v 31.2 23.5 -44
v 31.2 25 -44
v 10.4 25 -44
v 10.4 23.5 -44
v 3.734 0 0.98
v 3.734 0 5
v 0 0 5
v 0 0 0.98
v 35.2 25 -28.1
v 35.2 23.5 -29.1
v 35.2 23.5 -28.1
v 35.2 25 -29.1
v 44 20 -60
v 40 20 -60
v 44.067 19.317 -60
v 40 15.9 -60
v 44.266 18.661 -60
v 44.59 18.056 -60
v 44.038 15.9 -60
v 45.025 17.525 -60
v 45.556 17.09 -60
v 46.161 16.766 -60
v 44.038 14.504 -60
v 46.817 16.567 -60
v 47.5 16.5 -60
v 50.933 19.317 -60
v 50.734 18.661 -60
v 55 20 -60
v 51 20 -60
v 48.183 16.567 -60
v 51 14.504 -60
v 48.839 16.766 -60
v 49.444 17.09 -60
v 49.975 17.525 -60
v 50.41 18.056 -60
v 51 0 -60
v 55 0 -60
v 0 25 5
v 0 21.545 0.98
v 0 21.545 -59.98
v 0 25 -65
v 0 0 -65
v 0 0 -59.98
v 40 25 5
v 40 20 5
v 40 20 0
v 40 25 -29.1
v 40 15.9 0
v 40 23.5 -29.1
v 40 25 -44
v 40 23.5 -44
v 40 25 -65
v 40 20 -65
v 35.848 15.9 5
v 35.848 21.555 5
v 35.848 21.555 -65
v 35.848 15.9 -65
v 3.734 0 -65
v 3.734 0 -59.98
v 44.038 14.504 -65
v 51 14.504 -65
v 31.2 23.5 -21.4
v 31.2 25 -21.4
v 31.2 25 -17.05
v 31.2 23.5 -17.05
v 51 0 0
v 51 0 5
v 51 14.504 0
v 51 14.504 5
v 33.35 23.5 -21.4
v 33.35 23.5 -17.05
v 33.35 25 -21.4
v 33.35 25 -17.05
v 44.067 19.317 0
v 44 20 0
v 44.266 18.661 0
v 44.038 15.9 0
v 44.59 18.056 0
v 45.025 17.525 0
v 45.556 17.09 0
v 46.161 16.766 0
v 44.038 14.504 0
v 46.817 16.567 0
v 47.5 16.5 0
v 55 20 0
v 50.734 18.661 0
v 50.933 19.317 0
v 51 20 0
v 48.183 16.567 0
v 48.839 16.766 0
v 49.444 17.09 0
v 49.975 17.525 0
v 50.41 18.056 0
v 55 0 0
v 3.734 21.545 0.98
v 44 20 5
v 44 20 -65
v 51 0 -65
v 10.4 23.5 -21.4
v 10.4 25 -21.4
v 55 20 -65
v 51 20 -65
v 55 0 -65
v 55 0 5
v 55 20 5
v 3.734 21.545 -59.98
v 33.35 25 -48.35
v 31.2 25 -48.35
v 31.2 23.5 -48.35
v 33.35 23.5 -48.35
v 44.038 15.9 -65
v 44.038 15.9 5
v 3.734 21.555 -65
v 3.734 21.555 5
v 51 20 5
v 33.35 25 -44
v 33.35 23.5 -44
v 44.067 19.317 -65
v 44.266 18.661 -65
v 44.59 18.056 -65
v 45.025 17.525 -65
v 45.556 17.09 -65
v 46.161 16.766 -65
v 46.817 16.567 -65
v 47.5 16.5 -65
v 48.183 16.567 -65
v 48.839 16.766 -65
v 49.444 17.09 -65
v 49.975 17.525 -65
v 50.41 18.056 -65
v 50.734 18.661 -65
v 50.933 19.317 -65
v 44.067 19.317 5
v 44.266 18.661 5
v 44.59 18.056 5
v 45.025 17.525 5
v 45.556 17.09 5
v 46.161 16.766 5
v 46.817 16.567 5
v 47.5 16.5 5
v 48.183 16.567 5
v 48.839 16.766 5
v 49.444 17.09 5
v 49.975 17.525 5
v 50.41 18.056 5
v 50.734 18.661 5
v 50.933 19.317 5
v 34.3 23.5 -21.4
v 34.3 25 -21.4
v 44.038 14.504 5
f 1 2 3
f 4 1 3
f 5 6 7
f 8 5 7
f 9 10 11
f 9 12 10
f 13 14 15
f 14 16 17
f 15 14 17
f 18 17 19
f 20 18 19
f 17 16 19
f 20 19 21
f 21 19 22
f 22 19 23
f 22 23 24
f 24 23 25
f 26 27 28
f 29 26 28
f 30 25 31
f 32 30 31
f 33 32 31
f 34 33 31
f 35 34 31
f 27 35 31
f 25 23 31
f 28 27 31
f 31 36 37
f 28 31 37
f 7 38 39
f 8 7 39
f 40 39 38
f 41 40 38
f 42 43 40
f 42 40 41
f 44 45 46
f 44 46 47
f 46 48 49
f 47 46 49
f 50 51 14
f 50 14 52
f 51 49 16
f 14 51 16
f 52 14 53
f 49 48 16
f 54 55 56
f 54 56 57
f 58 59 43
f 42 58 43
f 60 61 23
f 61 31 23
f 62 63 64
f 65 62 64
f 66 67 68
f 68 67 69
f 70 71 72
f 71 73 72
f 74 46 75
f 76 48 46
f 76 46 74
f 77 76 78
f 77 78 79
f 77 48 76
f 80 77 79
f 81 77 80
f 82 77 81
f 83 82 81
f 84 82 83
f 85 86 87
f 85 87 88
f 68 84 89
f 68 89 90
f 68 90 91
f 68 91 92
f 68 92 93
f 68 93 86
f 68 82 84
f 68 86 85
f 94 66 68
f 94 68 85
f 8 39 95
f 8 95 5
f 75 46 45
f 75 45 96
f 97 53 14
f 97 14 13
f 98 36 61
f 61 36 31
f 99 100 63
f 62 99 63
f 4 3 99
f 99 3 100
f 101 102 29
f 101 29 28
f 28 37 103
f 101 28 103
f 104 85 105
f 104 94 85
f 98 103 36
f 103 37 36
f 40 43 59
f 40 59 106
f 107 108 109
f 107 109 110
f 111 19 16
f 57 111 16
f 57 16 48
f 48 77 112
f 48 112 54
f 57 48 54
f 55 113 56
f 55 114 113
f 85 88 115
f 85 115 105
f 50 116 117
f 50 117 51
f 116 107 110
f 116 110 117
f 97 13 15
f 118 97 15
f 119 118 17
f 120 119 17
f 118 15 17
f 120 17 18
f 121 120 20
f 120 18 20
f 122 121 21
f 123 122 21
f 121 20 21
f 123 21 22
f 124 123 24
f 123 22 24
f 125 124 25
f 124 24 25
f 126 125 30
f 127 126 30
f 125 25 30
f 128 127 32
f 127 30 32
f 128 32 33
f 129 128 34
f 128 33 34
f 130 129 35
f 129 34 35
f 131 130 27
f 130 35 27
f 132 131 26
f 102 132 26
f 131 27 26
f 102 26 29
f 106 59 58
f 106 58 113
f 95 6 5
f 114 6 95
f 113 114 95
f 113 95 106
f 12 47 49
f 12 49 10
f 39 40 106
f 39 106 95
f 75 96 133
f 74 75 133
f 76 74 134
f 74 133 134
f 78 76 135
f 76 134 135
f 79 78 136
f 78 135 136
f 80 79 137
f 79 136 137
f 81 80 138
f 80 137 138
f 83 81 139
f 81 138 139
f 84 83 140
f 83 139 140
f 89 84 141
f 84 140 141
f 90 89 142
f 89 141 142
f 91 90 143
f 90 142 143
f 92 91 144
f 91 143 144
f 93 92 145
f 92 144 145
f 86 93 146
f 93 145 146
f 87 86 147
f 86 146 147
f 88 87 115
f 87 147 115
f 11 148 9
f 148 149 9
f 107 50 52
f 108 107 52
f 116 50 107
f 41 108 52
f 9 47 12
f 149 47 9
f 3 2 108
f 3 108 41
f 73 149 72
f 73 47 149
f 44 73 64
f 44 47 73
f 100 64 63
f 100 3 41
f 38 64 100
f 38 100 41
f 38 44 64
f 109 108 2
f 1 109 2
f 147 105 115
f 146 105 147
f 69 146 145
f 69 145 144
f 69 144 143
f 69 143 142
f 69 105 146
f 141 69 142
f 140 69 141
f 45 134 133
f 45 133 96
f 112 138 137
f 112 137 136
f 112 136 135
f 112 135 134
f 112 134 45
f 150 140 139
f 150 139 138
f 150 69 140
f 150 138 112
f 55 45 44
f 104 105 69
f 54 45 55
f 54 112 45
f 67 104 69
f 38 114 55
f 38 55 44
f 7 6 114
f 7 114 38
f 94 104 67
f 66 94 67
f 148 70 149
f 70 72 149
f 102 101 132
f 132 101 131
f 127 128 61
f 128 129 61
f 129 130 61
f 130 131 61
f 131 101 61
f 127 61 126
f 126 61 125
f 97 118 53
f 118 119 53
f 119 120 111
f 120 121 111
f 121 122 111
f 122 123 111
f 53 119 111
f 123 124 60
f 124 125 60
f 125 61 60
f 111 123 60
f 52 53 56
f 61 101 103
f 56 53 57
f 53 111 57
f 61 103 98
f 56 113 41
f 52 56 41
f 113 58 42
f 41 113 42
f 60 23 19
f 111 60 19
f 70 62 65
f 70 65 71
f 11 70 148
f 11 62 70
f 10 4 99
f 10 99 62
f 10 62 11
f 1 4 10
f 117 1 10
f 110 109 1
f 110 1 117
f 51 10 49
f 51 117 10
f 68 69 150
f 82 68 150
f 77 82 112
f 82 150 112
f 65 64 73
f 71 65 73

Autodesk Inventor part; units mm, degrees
ref_plane "YZ Plane" through (0, 0, 0) normal (1, 0, 0) x (0, 1, 0)
ref_plane "XZ Plane" through (0, 0, 0) normal (0, 1, 0) x (-1, 0, 0)
ref_plane "XY Plane" through (0, 0, 0) normal (0, 0, 1) x (1, 0, 0)
sketch "Sketch1" plane through (0, 0, 0) normal (0, 1, 0) x (-1, 0, 0)
  line L0 (-40, 0) -> (-40, -60)
  line L1 (0, -60) -> (0, 0)
  line L2 (-40, -60) -> (-55, -60)
  line L3 (-55, -60) -> (-55, -65)
  line L4 (-55, -65) -> (0, -65)
  line L5 (0, -65) -> (0, -60)
  line L6 (-40, 0) -> (-55, 0)
  line L7 (-55, 0) -> (-55, 5)
  line L8 (-55, 5) -> (0, 5)
  line L9 (0, 5) -> (0, 0)
extrude "Extrusion1" add sketch "Sketch1" along normal blind 25
sketch "Sketch2" plane through (0, 25, 0) normal (0, 1, 0) x (1, 0, 0)
  line L0 (55, 0) -> (40, 0) projected
  line L1 (40, 0) -> (55, 0)
  line L2 (55, 0) -> (55, -5)
  line L3 (55, -5) -> (40, -5)
  line L4 (40, -5) -> (40, 0)
  line L5 (40, 0) -> (40, 60) projected
  line L6 (55, 60) -> (55, 65) projected
  line L7 (40, 60) -> (55, 60)
  line L8 (55, 60) -> (55, 65)
  line L9 (55, 65) -> (40, 65)
  line L10 (40, 65) -> (40, 60)
  point P0 (0, 0)
extrude "Extrusion2" cut sketch "Sketch2" against normal blind 5
sketch "Sketch3" plane through (0, 0, 5) normal (0, 0, 1) x (1, 0, 0)
  line L0 (55, 20) -> (40, 20) projected
  circle A0 centre (47.5, 20) radius 3.5
  point P0 (0, 0)
  dimension "d10" = 7
extrude "Extrusion3" cut sketch "Sketch3" against normal through all
sketch "Sketch4" plane through (0, 25, 0) normal (0, 1, 0) x (1, 0, 0)
  line L0 (40, 0) -> (40, 60) projected
  line L1 (40, 44.0004) -> (40, 29.1004)
  line L2 (31.2, 48.3504) -> (31.2, 44.0004)
  line L3 (31.2, 44.0004) -> (10.4, 44.0004)
  line L4 (10.4, 44.0004) -> (10.4, 21.4004)
  line L5 (10.4, 21.4004) -> (31.2, 21.4004)
  line L6 (31.2, 21.4004) -> (31.2, 17.0504)
  line L7 (31.2, 17.0504) -> (33.35, 17.0504)
  line L8 (33.35, 17.0504) -> (33.35, 21.4004)
  line L9 (31.2, 48.3504) -> (33.35, 48.3504)
  line L10 (33.35, 48.3504) -> (33.35, 44.0004)
  line L11 (33.35, 44.0004) -> (40, 44.0004)
  line L12 (40, 29.1004) -> (35.1995, 29.1004)
  line L13 (35.1995, 29.1004) -> (35.1995, 28.1004)
  line L14 (33.35, 21.4004) -> (34.3, 21.4004)
  line L15 (34.3, 21.4004) -> (35.1995, 28.1004)
  point P0 (0, 0)
  dimension "d13" = 14.9
  dimension "d19" = 20.8
  dimension "d20" = 22.6
  dimension "d21" = 20.8
  dimension "d32" = 2.15
  dimension "d33" = 2.15
  dimension "d34" = 1
  dimension "d35" = 0.95
extrude "Extrusion4" cut sketch "Sketch4" against normal blind 1.5
sketch "Sketch5" plane through (0, 0, 5) normal (0, 0, 1) x (1, 0, 0)
  line L0 (55, 0) -> (0, 0) projected
  line L1 (44.0382, 15.8995) -> (35.8479, 15.8995)
  line L2 (3.7342, 15.8995) -> (3.7342, 0)
  line L3 (3.7342, 0) -> (51, 0)
  line L4 (51, 0) -> (51, 14.5037)
  line L5 (51, 14.5037) -> (44.0382, 14.5037)
  line L6 (44.0382, 14.5037) -> (44.0382, 15.8995)
  line L7 (3.7342, 15.8995) -> (3.7342, 21.5553)
  line L8 (3.7342, 21.5553) -> (35.8479, 21.5553)
  line L9 (35.8479, 21.5553) -> (35.8479, 15.8995)
extrude "Extrusion5" cut sketch "Sketch5" against normal through all
sketch "Sketch9" plane through (0, 0, -65) normal (-1, 0, 0) x (0, 0, 1)
  line L0 (70, 0) -> (65, 0) projected
  line L1 (5.02, 21.545) -> (65.98, 21.545)
  line L2 (65.98, 21.545) -> (65.98, 0)
  line L3 (65.98, 0) -> (5.02, 0)
  line L4 (5.02, 0) -> (5.02, 21.545)
  dimension "d29" = 60.96
extrude "Extrusion6" cut sketch "Sketch9" against normal blind 10
properties part number "servo_sandboxv3"
